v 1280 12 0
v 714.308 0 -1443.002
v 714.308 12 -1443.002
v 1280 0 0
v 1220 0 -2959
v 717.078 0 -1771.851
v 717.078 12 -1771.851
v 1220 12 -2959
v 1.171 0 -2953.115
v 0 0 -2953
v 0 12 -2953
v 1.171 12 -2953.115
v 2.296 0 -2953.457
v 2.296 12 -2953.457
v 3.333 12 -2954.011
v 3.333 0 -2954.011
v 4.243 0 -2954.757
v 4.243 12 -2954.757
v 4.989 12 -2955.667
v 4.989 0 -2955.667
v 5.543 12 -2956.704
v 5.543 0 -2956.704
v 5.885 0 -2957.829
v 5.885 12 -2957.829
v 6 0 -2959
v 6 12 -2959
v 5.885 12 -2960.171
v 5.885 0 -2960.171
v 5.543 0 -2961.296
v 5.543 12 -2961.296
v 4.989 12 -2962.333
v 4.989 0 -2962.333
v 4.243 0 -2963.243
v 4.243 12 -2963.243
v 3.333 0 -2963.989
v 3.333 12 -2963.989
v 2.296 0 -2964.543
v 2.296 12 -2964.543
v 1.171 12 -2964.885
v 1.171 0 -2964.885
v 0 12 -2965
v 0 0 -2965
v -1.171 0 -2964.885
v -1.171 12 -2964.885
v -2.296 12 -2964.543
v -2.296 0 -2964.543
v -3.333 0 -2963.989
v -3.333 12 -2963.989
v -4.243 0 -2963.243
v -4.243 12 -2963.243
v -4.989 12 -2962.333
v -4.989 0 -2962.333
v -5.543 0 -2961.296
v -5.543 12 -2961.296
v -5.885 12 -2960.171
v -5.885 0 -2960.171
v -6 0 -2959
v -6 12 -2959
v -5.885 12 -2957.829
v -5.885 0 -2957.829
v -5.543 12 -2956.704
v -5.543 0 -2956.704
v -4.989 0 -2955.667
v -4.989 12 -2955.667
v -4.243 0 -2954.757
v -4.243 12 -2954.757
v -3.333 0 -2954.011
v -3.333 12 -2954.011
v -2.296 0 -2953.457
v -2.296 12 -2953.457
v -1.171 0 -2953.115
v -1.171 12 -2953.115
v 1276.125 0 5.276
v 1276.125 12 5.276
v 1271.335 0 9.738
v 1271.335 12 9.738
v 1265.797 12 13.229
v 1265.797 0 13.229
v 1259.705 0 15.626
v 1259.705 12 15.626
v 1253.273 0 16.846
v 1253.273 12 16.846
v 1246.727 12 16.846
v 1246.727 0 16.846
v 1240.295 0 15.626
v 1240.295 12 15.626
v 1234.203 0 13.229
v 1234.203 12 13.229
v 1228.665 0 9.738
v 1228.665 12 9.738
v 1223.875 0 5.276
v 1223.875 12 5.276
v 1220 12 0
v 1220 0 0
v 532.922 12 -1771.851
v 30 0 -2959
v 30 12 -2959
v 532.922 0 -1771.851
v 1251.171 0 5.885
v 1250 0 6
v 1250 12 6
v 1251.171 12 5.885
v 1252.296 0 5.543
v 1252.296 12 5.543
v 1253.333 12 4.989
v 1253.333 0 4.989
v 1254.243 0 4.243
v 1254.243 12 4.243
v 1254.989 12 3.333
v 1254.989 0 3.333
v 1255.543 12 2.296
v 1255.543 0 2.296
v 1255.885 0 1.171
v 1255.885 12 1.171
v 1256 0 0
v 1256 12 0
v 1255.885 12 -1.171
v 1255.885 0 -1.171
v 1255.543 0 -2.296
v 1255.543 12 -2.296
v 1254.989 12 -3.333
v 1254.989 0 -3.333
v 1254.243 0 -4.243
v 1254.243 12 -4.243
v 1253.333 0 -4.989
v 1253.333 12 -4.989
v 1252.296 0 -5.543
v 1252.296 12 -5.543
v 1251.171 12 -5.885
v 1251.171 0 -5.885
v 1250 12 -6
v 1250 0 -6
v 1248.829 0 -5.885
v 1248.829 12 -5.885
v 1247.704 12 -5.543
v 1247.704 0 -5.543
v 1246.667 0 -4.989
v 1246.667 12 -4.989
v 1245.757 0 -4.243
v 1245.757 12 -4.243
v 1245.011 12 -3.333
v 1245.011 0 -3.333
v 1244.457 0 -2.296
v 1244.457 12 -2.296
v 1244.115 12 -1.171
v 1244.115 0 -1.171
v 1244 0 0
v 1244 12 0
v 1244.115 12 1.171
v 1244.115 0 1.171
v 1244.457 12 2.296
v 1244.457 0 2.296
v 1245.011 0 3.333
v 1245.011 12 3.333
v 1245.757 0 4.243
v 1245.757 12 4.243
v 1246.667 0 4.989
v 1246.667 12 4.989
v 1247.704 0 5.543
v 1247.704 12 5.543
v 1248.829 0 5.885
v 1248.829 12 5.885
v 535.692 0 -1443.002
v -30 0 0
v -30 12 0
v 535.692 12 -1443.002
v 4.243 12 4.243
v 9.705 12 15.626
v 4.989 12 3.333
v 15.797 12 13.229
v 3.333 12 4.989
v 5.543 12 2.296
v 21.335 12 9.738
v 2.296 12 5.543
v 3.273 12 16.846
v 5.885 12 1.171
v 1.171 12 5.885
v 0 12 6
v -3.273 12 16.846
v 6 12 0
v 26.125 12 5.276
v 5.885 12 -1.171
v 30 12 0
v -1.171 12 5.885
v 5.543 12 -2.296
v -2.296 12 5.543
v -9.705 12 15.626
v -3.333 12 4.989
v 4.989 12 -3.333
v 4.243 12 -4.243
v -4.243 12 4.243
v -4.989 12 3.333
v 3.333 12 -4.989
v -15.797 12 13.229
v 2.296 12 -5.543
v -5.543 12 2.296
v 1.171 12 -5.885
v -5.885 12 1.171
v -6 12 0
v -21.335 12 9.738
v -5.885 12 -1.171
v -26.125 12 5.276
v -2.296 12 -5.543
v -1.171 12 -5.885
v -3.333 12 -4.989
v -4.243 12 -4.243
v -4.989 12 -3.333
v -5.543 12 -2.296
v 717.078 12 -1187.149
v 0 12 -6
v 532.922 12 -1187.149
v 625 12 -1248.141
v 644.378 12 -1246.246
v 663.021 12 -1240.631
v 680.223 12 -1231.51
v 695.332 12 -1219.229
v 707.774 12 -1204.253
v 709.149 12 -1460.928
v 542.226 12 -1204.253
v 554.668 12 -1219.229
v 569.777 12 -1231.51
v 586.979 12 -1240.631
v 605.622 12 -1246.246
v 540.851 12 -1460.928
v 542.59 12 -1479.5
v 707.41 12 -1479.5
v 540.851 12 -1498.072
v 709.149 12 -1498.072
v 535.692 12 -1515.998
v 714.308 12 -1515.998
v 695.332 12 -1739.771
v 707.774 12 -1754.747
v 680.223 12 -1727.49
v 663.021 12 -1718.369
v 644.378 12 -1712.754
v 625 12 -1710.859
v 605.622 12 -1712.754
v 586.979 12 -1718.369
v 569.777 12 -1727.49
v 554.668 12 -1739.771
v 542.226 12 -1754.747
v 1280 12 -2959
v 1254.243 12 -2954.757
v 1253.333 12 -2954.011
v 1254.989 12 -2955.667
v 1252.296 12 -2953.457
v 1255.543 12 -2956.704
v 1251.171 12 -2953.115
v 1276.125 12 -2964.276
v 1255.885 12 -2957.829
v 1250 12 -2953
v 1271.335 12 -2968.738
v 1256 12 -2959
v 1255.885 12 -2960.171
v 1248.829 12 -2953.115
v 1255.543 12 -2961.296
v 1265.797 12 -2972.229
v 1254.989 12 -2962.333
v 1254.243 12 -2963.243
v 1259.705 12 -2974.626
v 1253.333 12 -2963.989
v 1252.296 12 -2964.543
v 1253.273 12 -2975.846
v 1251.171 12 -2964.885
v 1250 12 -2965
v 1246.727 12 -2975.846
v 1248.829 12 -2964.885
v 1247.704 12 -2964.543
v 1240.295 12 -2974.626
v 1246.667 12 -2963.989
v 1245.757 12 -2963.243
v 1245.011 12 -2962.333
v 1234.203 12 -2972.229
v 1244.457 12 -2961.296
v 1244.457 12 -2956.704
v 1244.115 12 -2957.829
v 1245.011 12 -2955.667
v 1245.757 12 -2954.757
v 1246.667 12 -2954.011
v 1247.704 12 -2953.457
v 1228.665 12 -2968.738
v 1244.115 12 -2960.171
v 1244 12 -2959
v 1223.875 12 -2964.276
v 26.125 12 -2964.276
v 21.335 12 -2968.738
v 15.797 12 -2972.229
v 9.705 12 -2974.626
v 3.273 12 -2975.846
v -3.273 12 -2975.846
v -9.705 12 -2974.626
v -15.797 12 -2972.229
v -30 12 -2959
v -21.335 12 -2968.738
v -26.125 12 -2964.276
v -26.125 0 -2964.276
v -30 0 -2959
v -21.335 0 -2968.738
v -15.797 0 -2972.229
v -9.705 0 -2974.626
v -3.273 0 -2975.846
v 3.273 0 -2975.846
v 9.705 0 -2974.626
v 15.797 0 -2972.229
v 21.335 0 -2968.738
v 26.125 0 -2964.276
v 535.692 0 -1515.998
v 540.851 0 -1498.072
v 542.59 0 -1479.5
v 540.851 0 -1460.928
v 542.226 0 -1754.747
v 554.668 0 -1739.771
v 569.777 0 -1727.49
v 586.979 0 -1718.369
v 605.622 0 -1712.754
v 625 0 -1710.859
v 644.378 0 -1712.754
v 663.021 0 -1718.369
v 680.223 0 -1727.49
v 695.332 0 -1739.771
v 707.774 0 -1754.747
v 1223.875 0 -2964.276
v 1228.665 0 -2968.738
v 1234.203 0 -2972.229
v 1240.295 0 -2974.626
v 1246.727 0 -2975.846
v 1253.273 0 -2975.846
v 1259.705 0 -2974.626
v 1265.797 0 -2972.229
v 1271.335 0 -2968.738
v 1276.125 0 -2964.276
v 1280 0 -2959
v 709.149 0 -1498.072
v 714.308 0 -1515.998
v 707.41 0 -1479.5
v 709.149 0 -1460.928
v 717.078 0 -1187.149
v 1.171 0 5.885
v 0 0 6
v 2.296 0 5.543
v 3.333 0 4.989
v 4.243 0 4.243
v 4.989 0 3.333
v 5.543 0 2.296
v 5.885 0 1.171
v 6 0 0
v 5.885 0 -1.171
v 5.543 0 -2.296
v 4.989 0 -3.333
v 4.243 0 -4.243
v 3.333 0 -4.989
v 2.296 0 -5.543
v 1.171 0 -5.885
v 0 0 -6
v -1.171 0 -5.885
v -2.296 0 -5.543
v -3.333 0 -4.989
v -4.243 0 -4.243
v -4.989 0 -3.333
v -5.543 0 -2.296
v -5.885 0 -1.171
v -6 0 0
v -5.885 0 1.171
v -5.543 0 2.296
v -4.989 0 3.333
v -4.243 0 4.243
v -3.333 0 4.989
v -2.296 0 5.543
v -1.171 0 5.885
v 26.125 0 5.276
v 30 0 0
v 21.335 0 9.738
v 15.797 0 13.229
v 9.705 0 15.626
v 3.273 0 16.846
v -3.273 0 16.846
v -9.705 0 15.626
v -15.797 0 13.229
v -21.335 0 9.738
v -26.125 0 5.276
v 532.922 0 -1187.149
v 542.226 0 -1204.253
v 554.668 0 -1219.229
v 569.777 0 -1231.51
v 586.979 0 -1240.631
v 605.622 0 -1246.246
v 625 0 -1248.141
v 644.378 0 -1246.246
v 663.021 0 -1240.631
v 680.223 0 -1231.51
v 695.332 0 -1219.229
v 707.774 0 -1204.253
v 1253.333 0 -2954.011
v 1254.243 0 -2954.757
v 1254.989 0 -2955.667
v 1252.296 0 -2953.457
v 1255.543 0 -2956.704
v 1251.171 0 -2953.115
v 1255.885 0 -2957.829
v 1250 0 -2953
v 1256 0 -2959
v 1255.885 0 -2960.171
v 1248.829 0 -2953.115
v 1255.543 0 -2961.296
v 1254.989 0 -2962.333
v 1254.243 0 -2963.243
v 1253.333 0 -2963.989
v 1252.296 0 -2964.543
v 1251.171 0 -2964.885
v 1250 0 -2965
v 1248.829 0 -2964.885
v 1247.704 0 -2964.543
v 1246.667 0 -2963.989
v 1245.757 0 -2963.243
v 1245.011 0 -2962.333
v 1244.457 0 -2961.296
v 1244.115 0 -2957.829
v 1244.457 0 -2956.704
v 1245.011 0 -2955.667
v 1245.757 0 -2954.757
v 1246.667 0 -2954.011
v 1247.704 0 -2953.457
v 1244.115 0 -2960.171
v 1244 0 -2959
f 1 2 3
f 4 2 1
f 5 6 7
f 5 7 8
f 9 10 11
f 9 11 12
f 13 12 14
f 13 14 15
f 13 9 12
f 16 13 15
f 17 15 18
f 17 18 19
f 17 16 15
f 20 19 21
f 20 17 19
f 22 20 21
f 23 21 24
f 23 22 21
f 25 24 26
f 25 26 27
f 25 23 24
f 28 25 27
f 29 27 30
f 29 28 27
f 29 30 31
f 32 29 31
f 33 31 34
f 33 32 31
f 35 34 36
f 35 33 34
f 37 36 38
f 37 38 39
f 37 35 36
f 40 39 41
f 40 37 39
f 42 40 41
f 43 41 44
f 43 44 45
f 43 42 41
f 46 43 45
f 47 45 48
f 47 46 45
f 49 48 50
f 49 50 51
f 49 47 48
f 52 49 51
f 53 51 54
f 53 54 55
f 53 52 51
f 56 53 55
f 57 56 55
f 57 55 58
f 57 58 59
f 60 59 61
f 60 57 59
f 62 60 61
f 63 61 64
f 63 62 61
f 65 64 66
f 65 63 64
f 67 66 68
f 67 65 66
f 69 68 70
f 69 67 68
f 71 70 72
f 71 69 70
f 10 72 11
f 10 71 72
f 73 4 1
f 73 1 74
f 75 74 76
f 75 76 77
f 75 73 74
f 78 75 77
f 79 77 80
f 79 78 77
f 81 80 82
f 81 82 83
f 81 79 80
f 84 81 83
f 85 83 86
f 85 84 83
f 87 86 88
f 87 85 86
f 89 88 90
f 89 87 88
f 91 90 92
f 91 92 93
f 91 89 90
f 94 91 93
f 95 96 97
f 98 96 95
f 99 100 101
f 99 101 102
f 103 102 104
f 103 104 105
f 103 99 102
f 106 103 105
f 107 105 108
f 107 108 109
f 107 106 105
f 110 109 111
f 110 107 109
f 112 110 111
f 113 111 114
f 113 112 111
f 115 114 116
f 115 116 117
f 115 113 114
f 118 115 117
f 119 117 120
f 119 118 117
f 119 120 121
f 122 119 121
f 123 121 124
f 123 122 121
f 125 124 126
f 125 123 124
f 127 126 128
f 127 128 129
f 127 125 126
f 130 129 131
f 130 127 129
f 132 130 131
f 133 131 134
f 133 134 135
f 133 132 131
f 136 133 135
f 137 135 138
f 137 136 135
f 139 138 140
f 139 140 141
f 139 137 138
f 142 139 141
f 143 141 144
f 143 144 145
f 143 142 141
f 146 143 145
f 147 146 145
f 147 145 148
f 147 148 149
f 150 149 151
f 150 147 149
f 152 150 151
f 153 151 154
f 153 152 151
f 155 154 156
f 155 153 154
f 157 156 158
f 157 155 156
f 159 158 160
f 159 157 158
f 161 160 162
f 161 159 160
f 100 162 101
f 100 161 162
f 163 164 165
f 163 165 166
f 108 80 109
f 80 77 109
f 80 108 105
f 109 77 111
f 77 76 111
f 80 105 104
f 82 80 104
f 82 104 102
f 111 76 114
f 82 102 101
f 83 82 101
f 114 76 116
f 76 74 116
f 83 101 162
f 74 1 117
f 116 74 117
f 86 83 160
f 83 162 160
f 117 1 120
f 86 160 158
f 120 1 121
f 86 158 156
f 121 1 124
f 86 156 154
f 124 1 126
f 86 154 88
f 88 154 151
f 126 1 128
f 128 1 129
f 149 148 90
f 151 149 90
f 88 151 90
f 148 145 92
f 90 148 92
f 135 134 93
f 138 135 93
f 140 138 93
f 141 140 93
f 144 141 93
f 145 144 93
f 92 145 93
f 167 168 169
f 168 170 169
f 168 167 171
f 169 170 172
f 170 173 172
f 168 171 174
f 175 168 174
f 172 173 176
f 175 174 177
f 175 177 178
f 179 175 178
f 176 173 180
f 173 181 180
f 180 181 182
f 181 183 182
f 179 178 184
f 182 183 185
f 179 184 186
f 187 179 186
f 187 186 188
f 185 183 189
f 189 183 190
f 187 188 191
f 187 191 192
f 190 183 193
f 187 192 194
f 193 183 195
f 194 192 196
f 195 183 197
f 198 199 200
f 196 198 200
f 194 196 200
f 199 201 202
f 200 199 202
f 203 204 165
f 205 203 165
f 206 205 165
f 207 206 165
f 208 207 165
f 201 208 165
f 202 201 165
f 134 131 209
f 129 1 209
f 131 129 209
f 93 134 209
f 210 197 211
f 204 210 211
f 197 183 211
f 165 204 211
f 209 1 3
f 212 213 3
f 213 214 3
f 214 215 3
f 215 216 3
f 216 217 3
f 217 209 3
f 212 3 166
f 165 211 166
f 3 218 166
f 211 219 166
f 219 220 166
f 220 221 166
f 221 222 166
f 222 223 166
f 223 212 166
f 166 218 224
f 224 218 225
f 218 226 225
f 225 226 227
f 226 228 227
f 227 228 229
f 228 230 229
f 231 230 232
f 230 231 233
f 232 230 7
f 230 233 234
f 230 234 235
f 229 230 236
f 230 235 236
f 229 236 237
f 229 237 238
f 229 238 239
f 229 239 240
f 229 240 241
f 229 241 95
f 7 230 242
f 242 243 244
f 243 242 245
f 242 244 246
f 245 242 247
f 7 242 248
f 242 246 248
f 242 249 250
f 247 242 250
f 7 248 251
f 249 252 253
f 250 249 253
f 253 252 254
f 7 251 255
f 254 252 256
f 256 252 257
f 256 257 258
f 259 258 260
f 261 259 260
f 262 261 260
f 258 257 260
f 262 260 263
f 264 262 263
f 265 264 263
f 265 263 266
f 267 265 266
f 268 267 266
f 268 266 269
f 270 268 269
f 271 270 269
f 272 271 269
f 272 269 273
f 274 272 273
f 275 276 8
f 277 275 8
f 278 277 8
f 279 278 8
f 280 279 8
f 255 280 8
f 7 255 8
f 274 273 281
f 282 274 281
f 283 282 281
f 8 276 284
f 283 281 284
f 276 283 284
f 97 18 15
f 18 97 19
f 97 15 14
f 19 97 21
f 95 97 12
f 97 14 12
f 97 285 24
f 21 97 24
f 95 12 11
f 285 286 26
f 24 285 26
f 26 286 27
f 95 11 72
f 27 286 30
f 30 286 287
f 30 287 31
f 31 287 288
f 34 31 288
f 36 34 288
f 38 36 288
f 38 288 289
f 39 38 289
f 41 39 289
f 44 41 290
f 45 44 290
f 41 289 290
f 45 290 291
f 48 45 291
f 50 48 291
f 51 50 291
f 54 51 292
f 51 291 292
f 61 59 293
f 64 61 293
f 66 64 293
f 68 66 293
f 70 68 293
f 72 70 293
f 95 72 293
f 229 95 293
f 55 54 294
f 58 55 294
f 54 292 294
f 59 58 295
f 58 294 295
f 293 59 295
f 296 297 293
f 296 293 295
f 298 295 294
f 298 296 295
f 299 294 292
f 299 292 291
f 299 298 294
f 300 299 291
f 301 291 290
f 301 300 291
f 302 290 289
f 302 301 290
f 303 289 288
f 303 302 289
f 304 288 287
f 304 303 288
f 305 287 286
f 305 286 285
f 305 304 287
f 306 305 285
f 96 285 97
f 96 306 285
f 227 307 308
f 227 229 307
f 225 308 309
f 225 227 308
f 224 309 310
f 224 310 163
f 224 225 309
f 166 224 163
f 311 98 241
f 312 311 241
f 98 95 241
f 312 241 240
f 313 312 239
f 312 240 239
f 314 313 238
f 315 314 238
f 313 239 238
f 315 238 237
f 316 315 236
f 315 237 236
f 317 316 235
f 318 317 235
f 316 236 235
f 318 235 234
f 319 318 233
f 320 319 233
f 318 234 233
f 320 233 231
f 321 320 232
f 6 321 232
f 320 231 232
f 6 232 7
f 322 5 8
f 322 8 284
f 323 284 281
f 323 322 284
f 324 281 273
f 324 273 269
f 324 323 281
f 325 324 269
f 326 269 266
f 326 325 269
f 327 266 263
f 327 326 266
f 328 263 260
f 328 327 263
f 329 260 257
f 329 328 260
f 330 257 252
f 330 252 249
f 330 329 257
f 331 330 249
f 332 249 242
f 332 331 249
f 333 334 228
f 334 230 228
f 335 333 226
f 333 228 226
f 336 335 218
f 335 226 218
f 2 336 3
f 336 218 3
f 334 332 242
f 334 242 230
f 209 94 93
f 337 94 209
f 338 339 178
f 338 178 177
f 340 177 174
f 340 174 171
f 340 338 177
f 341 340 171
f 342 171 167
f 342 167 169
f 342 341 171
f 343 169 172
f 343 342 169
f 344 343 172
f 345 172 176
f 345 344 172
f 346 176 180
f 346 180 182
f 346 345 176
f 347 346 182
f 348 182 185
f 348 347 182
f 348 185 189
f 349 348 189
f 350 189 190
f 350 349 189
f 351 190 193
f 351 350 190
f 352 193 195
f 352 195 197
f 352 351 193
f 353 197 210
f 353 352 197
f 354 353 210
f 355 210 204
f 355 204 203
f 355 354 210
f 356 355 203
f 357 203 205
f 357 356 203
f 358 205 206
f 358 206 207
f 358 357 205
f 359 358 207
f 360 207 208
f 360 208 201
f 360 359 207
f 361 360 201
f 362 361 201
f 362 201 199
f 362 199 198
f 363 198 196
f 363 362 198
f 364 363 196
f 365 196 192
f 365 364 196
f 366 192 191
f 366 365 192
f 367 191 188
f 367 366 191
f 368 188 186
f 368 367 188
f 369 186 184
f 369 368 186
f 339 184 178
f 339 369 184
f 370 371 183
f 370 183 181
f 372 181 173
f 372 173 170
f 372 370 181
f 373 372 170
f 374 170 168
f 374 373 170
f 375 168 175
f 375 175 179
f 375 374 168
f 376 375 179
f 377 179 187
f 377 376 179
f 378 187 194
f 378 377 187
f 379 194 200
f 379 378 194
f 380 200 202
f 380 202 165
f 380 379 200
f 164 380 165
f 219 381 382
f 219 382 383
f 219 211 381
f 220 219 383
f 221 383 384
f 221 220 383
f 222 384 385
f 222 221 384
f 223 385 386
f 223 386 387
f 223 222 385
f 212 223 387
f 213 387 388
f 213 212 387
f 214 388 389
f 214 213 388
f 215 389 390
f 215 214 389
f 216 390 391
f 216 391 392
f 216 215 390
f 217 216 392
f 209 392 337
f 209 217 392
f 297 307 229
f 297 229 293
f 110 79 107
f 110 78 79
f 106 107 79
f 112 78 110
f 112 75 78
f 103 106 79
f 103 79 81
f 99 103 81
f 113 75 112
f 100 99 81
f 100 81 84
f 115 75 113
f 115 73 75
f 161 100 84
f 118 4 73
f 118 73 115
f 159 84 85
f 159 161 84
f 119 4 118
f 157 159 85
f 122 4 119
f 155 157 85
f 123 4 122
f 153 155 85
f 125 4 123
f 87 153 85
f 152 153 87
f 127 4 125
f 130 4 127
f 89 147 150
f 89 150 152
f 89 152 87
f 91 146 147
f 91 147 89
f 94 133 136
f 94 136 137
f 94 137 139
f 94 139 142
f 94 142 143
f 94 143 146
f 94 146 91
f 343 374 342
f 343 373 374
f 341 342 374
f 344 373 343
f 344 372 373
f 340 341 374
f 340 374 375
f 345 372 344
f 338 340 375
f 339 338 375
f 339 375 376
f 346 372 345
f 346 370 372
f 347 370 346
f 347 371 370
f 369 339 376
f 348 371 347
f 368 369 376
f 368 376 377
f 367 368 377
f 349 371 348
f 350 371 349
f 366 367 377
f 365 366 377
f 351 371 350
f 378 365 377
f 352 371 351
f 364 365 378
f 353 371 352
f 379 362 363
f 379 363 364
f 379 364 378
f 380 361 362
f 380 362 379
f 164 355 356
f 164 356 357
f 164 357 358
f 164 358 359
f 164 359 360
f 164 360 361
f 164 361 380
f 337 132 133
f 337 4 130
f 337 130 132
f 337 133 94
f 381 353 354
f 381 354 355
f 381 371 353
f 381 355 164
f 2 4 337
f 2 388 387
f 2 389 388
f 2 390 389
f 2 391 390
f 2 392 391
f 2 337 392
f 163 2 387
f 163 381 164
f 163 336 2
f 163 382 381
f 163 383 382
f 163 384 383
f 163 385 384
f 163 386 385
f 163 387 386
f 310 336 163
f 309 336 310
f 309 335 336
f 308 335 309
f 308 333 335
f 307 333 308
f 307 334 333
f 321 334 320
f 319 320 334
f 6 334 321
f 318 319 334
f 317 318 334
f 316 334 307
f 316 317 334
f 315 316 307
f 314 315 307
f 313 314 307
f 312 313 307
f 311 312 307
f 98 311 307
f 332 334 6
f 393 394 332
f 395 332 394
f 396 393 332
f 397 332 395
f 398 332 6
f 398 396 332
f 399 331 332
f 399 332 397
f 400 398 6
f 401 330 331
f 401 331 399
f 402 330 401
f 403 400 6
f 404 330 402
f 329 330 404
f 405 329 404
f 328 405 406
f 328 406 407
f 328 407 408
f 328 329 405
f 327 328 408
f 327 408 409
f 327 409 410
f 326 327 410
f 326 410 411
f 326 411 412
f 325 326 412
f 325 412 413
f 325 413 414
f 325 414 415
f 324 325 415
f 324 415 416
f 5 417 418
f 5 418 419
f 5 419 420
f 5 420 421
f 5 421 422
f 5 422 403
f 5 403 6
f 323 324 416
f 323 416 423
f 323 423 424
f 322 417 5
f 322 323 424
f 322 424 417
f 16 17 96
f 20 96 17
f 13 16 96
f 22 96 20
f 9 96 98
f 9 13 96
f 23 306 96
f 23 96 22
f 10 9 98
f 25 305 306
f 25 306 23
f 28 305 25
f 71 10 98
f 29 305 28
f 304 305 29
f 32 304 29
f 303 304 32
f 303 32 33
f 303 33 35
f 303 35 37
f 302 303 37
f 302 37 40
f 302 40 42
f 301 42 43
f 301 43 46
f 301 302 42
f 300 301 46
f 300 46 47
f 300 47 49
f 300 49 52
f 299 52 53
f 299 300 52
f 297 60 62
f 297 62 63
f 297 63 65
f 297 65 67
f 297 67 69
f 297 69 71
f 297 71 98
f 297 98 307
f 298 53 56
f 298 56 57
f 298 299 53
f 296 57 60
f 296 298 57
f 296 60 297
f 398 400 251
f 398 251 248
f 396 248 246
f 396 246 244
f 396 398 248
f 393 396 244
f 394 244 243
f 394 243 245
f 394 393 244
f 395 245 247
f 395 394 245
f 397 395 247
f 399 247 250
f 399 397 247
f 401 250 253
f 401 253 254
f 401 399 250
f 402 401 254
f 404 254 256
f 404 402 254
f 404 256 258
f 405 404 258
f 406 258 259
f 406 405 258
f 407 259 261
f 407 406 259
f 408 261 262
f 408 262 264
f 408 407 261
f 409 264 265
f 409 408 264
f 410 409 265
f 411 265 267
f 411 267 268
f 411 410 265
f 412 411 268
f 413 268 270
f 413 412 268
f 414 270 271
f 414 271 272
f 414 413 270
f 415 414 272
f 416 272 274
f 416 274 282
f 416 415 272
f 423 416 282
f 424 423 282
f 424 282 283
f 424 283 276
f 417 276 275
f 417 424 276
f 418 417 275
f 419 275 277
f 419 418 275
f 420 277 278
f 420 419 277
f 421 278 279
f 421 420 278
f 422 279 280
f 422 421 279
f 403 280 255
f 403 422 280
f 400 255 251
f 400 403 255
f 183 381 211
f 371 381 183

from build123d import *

# Parameters (mm, degrees)
SKETCH1_R           = 6
BOSS_EXTRUDE1_DEPTH = 12
FILLET1_R           = 100


with BuildPart() as part:
    # Sketch1 → Boss-Extrude1 (new body)
    with BuildSketch(Plane(origin=(0, 0, 0), x_dir=(1, 0, 0), z_dir=(0, 1, 0))):
        with BuildLine():
            Line((550, 1479.5), (-30, 2959))
            ThreePointArc((-30, 2959), (0, 2976), (30, 2959))
            Line((30, 2959), (625, 1554.5))
            Line((625, 1554.5), (1220, 2959))
            ThreePointArc((1220, 2959), (1250, 2976), (1280, 2959))
            Line((1280, 2959), (700, 1479.5))
            Line((700, 1479.5), (1280, 0))
            ThreePointArc((1280, 0), (1250, -17), (1220, 0))
            Line((1220, 0), (625, 1404.5))
            Line((625, 1404.5), (30, 0))
            ThreePointArc((30, 0), (0, -17), (-30, 0))
            Line((-30, 0), (550, 1479.5))
        make_face()
        with Locations(Location((0, 2959, 0), (0, 0, 270))):
            Circle(SKETCH1_R, mode=Mode.SUBTRACT)
        with Locations(Location((1250, 2959, 0), (0, 0, 270))):
            Circle(SKETCH1_R, mode=Mode.SUBTRACT)
        with Locations(Location((1250, 0, 0), (0, 0, 270))):
            Circle(SKETCH1_R, mode=Mode.SUBTRACT)
        with Locations(Location((0, 0, 0), (0, 0, 270))):
            Circle(SKETCH1_R, mode=Mode.SUBTRACT)
    extrude(amount=BOSS_EXTRUDE1_DEPTH)

    # Fillet1
    fillet1_edges = [part.edges().sort_by_distance(p)[0] for p in [
        (625, 6, -1554.5),
        (700, 6, -1479.5),
        (625, 6, -1404.5),
        (550, 6, -1479.5),
    ]]
    fillet(fillet1_edges, radius=FILLET1_R)


solid = part.part
